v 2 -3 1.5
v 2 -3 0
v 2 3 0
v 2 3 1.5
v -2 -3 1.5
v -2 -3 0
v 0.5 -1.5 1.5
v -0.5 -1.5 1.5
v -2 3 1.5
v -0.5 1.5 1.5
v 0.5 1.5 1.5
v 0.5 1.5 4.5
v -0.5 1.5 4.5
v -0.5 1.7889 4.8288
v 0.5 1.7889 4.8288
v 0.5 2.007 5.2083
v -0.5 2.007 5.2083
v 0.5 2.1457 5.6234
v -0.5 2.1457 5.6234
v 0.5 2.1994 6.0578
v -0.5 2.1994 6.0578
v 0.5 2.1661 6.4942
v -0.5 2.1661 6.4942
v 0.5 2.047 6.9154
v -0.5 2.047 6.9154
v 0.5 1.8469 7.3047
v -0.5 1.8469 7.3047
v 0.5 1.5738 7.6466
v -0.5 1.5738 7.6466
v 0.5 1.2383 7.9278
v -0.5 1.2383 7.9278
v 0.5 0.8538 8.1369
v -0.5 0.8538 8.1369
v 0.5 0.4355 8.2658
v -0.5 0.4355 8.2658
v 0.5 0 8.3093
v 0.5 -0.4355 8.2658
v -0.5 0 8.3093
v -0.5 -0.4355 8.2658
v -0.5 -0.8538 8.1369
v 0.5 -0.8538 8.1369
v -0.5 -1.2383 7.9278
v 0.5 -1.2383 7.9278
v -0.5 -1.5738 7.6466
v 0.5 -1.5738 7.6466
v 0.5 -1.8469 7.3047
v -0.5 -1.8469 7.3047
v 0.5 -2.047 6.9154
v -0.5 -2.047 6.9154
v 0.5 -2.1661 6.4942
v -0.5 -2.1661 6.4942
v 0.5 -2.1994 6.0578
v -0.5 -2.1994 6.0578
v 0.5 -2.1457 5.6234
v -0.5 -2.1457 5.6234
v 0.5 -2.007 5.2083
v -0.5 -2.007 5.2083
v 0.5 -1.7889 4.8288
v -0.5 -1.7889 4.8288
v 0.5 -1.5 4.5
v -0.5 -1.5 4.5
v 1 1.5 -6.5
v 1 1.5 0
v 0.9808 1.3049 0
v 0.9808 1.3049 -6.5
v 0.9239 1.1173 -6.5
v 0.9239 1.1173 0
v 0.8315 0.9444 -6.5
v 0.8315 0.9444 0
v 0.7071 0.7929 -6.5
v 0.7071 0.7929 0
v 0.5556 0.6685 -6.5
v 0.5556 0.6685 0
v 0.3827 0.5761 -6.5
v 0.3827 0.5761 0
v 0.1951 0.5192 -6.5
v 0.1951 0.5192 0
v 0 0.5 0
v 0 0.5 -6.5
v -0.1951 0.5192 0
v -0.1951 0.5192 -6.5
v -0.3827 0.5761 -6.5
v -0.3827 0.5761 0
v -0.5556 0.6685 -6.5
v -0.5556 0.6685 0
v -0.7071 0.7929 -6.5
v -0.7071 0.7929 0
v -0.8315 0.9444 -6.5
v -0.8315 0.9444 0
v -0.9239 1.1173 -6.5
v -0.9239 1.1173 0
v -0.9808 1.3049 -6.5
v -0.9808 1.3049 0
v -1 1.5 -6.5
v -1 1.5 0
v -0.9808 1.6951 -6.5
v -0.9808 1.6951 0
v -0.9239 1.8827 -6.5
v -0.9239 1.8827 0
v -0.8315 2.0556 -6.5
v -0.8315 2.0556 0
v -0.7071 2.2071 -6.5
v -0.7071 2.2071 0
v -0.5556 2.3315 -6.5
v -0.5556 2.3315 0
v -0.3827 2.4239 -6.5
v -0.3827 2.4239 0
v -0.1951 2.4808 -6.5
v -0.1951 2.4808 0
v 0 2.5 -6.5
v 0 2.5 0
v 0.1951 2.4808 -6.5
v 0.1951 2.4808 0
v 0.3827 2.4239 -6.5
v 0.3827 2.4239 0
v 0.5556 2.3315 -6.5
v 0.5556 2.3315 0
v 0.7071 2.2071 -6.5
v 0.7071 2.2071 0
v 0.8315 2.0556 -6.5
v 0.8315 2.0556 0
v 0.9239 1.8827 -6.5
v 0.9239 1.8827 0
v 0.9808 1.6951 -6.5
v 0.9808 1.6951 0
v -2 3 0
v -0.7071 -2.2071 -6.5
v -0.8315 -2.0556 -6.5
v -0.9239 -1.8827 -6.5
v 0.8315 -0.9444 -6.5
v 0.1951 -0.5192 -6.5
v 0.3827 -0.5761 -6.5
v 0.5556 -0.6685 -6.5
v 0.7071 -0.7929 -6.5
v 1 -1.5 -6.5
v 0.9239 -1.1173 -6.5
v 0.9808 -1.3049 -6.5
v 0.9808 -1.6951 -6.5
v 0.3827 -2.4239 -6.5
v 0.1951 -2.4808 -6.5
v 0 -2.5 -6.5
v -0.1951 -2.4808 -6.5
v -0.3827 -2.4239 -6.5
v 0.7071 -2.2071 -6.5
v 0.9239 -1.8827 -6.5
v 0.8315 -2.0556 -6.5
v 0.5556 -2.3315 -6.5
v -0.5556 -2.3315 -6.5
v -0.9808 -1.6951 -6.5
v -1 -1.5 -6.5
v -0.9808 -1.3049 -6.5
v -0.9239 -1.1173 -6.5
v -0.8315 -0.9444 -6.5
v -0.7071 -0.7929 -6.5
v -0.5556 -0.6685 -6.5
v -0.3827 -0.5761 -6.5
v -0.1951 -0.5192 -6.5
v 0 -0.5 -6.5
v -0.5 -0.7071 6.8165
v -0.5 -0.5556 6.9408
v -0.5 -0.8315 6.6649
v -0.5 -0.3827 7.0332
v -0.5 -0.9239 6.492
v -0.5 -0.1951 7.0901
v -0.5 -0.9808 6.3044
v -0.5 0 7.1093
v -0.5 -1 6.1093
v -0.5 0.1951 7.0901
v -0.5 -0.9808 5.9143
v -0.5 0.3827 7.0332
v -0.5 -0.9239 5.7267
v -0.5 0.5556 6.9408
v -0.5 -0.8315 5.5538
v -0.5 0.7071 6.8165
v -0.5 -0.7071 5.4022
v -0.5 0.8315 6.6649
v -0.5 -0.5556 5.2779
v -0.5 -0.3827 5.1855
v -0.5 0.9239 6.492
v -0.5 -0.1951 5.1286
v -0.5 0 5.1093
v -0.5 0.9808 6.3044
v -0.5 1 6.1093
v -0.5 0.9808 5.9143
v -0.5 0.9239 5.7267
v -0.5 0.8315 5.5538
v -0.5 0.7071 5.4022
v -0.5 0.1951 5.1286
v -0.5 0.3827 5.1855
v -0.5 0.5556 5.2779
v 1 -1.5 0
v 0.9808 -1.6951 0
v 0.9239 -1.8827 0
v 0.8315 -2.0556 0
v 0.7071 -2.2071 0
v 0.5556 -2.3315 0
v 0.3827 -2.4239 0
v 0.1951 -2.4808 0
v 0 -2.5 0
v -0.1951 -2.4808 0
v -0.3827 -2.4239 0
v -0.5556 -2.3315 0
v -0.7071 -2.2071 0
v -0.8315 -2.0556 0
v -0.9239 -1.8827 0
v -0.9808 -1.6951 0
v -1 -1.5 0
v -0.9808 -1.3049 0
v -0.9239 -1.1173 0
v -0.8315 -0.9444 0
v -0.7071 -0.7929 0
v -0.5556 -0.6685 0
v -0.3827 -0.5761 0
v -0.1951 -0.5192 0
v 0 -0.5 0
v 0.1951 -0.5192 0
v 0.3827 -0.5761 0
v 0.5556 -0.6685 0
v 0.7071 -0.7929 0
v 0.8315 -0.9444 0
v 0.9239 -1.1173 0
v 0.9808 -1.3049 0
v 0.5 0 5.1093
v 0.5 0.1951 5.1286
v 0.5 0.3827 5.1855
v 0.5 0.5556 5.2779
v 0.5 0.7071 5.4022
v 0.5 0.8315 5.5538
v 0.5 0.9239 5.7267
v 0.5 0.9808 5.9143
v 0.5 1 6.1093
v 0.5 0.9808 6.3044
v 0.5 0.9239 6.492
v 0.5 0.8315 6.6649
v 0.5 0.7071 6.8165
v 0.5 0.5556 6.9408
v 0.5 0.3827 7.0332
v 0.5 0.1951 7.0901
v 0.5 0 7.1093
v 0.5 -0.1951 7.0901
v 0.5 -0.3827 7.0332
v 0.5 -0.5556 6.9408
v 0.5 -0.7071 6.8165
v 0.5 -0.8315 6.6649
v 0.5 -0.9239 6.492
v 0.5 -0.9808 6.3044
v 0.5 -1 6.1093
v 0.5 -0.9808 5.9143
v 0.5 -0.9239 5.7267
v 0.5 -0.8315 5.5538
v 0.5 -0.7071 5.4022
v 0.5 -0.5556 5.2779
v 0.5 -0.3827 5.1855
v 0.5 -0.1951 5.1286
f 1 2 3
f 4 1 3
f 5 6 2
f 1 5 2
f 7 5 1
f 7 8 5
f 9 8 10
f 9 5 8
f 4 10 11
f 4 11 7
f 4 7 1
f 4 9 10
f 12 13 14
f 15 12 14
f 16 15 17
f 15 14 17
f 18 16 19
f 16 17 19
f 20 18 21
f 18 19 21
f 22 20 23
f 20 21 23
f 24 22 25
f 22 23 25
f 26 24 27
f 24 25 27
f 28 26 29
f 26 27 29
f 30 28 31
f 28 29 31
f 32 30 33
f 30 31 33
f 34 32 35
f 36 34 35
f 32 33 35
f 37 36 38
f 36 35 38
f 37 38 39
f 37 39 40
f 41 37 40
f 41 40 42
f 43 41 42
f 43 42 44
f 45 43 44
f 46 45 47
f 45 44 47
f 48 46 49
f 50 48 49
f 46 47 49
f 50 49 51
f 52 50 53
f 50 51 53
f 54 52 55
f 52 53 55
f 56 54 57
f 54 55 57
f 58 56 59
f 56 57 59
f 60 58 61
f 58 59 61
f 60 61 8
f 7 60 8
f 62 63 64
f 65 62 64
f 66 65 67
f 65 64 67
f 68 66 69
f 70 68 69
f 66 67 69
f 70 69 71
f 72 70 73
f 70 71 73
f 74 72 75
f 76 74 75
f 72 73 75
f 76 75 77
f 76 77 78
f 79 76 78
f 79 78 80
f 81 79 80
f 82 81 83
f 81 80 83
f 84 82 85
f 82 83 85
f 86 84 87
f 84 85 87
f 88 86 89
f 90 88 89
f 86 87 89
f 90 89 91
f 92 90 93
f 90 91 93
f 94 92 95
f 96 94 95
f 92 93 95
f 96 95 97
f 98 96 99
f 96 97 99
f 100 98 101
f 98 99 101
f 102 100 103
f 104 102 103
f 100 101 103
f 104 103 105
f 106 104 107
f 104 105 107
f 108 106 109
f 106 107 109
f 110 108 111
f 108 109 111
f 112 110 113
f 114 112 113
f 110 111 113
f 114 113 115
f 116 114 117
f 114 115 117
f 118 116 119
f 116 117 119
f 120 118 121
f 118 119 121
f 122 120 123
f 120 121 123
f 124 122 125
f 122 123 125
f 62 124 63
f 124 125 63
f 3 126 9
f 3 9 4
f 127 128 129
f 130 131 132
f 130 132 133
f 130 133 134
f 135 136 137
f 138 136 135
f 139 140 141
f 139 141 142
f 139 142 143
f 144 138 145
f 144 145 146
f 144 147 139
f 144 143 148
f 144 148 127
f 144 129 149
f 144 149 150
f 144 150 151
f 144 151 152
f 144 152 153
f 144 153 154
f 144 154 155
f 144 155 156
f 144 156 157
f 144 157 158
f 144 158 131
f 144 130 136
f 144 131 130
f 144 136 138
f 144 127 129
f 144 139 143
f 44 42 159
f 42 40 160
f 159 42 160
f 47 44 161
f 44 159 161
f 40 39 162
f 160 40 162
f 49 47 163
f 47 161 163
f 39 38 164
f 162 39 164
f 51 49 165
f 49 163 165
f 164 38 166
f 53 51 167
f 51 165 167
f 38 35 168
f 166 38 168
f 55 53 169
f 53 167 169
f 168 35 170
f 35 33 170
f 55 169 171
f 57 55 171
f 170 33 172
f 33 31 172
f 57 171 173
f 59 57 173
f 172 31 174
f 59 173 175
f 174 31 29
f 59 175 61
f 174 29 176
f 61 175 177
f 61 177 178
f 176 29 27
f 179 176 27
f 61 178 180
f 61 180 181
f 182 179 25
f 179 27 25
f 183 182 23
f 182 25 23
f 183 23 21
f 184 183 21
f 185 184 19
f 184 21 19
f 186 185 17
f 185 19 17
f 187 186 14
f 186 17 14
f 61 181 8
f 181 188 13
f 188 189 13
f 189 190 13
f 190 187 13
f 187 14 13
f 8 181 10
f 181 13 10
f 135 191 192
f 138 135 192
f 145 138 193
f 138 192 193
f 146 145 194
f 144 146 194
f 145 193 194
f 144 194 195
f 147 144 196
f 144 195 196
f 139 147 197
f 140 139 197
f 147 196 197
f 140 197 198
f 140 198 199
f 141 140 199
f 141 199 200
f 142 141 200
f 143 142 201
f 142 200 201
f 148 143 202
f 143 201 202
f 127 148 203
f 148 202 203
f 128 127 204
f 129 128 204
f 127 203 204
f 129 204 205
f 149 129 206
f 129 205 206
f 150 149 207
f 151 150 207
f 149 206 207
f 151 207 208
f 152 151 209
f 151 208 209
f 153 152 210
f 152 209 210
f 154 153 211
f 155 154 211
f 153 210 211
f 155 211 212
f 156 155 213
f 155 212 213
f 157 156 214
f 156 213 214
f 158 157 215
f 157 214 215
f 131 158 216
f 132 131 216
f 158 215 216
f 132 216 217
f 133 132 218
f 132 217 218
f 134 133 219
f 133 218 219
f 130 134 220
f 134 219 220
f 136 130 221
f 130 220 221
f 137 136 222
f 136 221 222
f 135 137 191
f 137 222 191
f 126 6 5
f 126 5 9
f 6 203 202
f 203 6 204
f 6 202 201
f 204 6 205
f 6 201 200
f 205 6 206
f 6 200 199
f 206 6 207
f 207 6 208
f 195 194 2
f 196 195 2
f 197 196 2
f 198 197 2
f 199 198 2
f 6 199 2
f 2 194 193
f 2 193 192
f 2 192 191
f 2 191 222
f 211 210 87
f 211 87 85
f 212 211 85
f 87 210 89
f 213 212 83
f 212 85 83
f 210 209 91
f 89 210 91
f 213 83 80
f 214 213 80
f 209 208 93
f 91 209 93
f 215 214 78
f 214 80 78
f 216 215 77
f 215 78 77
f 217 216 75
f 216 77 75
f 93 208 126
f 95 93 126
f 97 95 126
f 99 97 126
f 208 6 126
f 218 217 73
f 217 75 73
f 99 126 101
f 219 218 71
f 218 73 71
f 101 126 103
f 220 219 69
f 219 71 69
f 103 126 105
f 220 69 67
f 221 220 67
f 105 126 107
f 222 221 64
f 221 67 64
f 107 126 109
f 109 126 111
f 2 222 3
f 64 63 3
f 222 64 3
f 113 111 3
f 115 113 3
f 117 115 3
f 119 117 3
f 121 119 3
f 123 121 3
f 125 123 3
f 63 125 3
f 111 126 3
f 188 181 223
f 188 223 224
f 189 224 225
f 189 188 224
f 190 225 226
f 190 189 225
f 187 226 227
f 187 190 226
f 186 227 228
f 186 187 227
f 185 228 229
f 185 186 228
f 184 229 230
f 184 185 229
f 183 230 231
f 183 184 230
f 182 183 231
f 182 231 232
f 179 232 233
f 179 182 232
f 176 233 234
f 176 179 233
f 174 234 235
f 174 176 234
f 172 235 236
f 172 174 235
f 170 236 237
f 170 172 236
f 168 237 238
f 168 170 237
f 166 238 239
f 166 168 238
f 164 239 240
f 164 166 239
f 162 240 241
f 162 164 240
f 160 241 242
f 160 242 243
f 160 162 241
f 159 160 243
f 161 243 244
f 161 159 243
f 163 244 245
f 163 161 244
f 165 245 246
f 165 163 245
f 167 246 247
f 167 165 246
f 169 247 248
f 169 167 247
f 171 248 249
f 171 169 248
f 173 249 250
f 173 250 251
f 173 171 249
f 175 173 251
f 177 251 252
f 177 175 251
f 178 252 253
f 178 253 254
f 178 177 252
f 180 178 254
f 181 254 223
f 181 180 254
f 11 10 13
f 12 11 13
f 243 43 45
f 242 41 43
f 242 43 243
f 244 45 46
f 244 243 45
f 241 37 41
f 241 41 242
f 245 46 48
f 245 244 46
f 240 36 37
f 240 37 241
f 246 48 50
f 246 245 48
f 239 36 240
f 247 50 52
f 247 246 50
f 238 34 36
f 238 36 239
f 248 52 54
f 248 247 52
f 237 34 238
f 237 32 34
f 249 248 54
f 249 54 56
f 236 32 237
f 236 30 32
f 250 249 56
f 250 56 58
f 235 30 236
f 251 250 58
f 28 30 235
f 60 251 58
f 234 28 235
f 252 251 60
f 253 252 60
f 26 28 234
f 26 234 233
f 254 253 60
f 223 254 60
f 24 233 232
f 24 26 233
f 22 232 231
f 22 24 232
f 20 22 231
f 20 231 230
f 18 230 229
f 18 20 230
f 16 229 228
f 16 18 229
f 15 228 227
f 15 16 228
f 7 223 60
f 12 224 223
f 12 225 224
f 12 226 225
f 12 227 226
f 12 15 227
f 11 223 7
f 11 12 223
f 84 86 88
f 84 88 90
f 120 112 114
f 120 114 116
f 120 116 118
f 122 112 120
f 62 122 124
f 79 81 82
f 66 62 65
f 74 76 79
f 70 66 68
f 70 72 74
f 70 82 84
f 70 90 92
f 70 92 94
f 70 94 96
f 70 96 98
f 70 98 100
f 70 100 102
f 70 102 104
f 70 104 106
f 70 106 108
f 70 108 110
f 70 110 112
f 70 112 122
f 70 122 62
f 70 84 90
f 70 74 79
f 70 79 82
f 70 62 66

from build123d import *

# Parameters (mm, degrees)
SKETCH1_W                = 4
SKETCH1_H                = 6
BOSS_EXTRUDE1_DEPTH      = 1.5
BOSS_EXTRUDE2_DEPTH      = 0.5
BOSS_EXTRUDE2_DEPTH_BACK = 0.5
BOSS_EXTRUDE2_START      = -2
SKETCH2_R                = 1
SKETCH3_R                = 1
BOSS_EXTRUDE3_DEPTH      = 6.5


with BuildPart() as part:
    # Sketch1 → Boss-Extrude1 (new body)
    with BuildSketch(Plane.XY):
        Rectangle(SKETCH1_W, SKETCH1_H)
    extrude(amount=BOSS_EXTRUDE1_DEPTH)

    # Sketch2 → Boss-Extrude2 (add, two sides: drawn at the far end of the back side and taken through both)
    with BuildSketch(Plane(origin=(2, 0, 0), x_dir=(0, 0, -1), z_dir=(1, 0, 0)).offset(BOSS_EXTRUDE2_START - BOSS_EXTRUDE2_DEPTH_BACK)):
        with BuildLine():
            Line((-1.5, 1.5), (-4.5, 1.5))
            ThreePointArc((-4.5, 1.5), (-8.309347694, 0), (-4.5, -1.5))
            Line((-4.5, -1.5), (-1.5, -1.5))
            Line((-1.5, -1.5), (-1.5, 1.5))
        make_face()
        with Locations((-6.109347694, 0)):
            Circle(SKETCH2_R, mode=Mode.SUBTRACT)
    extrude(amount=BOSS_EXTRUDE2_DEPTH + BOSS_EXTRUDE2_DEPTH_BACK)

    # Sketch3 → Boss-Extrude3 (add)
    with BuildSketch(Plane(origin=(0, 0, 0), x_dir=(-1, 0, 0), z_dir=(0, 0, -1))):
        with Locations(Location((0, 1.5, 0), (0, 0, 180))):
            Circle(SKETCH3_R)
        with Locations(Location((0, -1.5, 0), (0, 0, 180))):
            Circle(SKETCH3_R)
    extrude(amount=BOSS_EXTRUDE3_DEPTH)


solid = part.part
